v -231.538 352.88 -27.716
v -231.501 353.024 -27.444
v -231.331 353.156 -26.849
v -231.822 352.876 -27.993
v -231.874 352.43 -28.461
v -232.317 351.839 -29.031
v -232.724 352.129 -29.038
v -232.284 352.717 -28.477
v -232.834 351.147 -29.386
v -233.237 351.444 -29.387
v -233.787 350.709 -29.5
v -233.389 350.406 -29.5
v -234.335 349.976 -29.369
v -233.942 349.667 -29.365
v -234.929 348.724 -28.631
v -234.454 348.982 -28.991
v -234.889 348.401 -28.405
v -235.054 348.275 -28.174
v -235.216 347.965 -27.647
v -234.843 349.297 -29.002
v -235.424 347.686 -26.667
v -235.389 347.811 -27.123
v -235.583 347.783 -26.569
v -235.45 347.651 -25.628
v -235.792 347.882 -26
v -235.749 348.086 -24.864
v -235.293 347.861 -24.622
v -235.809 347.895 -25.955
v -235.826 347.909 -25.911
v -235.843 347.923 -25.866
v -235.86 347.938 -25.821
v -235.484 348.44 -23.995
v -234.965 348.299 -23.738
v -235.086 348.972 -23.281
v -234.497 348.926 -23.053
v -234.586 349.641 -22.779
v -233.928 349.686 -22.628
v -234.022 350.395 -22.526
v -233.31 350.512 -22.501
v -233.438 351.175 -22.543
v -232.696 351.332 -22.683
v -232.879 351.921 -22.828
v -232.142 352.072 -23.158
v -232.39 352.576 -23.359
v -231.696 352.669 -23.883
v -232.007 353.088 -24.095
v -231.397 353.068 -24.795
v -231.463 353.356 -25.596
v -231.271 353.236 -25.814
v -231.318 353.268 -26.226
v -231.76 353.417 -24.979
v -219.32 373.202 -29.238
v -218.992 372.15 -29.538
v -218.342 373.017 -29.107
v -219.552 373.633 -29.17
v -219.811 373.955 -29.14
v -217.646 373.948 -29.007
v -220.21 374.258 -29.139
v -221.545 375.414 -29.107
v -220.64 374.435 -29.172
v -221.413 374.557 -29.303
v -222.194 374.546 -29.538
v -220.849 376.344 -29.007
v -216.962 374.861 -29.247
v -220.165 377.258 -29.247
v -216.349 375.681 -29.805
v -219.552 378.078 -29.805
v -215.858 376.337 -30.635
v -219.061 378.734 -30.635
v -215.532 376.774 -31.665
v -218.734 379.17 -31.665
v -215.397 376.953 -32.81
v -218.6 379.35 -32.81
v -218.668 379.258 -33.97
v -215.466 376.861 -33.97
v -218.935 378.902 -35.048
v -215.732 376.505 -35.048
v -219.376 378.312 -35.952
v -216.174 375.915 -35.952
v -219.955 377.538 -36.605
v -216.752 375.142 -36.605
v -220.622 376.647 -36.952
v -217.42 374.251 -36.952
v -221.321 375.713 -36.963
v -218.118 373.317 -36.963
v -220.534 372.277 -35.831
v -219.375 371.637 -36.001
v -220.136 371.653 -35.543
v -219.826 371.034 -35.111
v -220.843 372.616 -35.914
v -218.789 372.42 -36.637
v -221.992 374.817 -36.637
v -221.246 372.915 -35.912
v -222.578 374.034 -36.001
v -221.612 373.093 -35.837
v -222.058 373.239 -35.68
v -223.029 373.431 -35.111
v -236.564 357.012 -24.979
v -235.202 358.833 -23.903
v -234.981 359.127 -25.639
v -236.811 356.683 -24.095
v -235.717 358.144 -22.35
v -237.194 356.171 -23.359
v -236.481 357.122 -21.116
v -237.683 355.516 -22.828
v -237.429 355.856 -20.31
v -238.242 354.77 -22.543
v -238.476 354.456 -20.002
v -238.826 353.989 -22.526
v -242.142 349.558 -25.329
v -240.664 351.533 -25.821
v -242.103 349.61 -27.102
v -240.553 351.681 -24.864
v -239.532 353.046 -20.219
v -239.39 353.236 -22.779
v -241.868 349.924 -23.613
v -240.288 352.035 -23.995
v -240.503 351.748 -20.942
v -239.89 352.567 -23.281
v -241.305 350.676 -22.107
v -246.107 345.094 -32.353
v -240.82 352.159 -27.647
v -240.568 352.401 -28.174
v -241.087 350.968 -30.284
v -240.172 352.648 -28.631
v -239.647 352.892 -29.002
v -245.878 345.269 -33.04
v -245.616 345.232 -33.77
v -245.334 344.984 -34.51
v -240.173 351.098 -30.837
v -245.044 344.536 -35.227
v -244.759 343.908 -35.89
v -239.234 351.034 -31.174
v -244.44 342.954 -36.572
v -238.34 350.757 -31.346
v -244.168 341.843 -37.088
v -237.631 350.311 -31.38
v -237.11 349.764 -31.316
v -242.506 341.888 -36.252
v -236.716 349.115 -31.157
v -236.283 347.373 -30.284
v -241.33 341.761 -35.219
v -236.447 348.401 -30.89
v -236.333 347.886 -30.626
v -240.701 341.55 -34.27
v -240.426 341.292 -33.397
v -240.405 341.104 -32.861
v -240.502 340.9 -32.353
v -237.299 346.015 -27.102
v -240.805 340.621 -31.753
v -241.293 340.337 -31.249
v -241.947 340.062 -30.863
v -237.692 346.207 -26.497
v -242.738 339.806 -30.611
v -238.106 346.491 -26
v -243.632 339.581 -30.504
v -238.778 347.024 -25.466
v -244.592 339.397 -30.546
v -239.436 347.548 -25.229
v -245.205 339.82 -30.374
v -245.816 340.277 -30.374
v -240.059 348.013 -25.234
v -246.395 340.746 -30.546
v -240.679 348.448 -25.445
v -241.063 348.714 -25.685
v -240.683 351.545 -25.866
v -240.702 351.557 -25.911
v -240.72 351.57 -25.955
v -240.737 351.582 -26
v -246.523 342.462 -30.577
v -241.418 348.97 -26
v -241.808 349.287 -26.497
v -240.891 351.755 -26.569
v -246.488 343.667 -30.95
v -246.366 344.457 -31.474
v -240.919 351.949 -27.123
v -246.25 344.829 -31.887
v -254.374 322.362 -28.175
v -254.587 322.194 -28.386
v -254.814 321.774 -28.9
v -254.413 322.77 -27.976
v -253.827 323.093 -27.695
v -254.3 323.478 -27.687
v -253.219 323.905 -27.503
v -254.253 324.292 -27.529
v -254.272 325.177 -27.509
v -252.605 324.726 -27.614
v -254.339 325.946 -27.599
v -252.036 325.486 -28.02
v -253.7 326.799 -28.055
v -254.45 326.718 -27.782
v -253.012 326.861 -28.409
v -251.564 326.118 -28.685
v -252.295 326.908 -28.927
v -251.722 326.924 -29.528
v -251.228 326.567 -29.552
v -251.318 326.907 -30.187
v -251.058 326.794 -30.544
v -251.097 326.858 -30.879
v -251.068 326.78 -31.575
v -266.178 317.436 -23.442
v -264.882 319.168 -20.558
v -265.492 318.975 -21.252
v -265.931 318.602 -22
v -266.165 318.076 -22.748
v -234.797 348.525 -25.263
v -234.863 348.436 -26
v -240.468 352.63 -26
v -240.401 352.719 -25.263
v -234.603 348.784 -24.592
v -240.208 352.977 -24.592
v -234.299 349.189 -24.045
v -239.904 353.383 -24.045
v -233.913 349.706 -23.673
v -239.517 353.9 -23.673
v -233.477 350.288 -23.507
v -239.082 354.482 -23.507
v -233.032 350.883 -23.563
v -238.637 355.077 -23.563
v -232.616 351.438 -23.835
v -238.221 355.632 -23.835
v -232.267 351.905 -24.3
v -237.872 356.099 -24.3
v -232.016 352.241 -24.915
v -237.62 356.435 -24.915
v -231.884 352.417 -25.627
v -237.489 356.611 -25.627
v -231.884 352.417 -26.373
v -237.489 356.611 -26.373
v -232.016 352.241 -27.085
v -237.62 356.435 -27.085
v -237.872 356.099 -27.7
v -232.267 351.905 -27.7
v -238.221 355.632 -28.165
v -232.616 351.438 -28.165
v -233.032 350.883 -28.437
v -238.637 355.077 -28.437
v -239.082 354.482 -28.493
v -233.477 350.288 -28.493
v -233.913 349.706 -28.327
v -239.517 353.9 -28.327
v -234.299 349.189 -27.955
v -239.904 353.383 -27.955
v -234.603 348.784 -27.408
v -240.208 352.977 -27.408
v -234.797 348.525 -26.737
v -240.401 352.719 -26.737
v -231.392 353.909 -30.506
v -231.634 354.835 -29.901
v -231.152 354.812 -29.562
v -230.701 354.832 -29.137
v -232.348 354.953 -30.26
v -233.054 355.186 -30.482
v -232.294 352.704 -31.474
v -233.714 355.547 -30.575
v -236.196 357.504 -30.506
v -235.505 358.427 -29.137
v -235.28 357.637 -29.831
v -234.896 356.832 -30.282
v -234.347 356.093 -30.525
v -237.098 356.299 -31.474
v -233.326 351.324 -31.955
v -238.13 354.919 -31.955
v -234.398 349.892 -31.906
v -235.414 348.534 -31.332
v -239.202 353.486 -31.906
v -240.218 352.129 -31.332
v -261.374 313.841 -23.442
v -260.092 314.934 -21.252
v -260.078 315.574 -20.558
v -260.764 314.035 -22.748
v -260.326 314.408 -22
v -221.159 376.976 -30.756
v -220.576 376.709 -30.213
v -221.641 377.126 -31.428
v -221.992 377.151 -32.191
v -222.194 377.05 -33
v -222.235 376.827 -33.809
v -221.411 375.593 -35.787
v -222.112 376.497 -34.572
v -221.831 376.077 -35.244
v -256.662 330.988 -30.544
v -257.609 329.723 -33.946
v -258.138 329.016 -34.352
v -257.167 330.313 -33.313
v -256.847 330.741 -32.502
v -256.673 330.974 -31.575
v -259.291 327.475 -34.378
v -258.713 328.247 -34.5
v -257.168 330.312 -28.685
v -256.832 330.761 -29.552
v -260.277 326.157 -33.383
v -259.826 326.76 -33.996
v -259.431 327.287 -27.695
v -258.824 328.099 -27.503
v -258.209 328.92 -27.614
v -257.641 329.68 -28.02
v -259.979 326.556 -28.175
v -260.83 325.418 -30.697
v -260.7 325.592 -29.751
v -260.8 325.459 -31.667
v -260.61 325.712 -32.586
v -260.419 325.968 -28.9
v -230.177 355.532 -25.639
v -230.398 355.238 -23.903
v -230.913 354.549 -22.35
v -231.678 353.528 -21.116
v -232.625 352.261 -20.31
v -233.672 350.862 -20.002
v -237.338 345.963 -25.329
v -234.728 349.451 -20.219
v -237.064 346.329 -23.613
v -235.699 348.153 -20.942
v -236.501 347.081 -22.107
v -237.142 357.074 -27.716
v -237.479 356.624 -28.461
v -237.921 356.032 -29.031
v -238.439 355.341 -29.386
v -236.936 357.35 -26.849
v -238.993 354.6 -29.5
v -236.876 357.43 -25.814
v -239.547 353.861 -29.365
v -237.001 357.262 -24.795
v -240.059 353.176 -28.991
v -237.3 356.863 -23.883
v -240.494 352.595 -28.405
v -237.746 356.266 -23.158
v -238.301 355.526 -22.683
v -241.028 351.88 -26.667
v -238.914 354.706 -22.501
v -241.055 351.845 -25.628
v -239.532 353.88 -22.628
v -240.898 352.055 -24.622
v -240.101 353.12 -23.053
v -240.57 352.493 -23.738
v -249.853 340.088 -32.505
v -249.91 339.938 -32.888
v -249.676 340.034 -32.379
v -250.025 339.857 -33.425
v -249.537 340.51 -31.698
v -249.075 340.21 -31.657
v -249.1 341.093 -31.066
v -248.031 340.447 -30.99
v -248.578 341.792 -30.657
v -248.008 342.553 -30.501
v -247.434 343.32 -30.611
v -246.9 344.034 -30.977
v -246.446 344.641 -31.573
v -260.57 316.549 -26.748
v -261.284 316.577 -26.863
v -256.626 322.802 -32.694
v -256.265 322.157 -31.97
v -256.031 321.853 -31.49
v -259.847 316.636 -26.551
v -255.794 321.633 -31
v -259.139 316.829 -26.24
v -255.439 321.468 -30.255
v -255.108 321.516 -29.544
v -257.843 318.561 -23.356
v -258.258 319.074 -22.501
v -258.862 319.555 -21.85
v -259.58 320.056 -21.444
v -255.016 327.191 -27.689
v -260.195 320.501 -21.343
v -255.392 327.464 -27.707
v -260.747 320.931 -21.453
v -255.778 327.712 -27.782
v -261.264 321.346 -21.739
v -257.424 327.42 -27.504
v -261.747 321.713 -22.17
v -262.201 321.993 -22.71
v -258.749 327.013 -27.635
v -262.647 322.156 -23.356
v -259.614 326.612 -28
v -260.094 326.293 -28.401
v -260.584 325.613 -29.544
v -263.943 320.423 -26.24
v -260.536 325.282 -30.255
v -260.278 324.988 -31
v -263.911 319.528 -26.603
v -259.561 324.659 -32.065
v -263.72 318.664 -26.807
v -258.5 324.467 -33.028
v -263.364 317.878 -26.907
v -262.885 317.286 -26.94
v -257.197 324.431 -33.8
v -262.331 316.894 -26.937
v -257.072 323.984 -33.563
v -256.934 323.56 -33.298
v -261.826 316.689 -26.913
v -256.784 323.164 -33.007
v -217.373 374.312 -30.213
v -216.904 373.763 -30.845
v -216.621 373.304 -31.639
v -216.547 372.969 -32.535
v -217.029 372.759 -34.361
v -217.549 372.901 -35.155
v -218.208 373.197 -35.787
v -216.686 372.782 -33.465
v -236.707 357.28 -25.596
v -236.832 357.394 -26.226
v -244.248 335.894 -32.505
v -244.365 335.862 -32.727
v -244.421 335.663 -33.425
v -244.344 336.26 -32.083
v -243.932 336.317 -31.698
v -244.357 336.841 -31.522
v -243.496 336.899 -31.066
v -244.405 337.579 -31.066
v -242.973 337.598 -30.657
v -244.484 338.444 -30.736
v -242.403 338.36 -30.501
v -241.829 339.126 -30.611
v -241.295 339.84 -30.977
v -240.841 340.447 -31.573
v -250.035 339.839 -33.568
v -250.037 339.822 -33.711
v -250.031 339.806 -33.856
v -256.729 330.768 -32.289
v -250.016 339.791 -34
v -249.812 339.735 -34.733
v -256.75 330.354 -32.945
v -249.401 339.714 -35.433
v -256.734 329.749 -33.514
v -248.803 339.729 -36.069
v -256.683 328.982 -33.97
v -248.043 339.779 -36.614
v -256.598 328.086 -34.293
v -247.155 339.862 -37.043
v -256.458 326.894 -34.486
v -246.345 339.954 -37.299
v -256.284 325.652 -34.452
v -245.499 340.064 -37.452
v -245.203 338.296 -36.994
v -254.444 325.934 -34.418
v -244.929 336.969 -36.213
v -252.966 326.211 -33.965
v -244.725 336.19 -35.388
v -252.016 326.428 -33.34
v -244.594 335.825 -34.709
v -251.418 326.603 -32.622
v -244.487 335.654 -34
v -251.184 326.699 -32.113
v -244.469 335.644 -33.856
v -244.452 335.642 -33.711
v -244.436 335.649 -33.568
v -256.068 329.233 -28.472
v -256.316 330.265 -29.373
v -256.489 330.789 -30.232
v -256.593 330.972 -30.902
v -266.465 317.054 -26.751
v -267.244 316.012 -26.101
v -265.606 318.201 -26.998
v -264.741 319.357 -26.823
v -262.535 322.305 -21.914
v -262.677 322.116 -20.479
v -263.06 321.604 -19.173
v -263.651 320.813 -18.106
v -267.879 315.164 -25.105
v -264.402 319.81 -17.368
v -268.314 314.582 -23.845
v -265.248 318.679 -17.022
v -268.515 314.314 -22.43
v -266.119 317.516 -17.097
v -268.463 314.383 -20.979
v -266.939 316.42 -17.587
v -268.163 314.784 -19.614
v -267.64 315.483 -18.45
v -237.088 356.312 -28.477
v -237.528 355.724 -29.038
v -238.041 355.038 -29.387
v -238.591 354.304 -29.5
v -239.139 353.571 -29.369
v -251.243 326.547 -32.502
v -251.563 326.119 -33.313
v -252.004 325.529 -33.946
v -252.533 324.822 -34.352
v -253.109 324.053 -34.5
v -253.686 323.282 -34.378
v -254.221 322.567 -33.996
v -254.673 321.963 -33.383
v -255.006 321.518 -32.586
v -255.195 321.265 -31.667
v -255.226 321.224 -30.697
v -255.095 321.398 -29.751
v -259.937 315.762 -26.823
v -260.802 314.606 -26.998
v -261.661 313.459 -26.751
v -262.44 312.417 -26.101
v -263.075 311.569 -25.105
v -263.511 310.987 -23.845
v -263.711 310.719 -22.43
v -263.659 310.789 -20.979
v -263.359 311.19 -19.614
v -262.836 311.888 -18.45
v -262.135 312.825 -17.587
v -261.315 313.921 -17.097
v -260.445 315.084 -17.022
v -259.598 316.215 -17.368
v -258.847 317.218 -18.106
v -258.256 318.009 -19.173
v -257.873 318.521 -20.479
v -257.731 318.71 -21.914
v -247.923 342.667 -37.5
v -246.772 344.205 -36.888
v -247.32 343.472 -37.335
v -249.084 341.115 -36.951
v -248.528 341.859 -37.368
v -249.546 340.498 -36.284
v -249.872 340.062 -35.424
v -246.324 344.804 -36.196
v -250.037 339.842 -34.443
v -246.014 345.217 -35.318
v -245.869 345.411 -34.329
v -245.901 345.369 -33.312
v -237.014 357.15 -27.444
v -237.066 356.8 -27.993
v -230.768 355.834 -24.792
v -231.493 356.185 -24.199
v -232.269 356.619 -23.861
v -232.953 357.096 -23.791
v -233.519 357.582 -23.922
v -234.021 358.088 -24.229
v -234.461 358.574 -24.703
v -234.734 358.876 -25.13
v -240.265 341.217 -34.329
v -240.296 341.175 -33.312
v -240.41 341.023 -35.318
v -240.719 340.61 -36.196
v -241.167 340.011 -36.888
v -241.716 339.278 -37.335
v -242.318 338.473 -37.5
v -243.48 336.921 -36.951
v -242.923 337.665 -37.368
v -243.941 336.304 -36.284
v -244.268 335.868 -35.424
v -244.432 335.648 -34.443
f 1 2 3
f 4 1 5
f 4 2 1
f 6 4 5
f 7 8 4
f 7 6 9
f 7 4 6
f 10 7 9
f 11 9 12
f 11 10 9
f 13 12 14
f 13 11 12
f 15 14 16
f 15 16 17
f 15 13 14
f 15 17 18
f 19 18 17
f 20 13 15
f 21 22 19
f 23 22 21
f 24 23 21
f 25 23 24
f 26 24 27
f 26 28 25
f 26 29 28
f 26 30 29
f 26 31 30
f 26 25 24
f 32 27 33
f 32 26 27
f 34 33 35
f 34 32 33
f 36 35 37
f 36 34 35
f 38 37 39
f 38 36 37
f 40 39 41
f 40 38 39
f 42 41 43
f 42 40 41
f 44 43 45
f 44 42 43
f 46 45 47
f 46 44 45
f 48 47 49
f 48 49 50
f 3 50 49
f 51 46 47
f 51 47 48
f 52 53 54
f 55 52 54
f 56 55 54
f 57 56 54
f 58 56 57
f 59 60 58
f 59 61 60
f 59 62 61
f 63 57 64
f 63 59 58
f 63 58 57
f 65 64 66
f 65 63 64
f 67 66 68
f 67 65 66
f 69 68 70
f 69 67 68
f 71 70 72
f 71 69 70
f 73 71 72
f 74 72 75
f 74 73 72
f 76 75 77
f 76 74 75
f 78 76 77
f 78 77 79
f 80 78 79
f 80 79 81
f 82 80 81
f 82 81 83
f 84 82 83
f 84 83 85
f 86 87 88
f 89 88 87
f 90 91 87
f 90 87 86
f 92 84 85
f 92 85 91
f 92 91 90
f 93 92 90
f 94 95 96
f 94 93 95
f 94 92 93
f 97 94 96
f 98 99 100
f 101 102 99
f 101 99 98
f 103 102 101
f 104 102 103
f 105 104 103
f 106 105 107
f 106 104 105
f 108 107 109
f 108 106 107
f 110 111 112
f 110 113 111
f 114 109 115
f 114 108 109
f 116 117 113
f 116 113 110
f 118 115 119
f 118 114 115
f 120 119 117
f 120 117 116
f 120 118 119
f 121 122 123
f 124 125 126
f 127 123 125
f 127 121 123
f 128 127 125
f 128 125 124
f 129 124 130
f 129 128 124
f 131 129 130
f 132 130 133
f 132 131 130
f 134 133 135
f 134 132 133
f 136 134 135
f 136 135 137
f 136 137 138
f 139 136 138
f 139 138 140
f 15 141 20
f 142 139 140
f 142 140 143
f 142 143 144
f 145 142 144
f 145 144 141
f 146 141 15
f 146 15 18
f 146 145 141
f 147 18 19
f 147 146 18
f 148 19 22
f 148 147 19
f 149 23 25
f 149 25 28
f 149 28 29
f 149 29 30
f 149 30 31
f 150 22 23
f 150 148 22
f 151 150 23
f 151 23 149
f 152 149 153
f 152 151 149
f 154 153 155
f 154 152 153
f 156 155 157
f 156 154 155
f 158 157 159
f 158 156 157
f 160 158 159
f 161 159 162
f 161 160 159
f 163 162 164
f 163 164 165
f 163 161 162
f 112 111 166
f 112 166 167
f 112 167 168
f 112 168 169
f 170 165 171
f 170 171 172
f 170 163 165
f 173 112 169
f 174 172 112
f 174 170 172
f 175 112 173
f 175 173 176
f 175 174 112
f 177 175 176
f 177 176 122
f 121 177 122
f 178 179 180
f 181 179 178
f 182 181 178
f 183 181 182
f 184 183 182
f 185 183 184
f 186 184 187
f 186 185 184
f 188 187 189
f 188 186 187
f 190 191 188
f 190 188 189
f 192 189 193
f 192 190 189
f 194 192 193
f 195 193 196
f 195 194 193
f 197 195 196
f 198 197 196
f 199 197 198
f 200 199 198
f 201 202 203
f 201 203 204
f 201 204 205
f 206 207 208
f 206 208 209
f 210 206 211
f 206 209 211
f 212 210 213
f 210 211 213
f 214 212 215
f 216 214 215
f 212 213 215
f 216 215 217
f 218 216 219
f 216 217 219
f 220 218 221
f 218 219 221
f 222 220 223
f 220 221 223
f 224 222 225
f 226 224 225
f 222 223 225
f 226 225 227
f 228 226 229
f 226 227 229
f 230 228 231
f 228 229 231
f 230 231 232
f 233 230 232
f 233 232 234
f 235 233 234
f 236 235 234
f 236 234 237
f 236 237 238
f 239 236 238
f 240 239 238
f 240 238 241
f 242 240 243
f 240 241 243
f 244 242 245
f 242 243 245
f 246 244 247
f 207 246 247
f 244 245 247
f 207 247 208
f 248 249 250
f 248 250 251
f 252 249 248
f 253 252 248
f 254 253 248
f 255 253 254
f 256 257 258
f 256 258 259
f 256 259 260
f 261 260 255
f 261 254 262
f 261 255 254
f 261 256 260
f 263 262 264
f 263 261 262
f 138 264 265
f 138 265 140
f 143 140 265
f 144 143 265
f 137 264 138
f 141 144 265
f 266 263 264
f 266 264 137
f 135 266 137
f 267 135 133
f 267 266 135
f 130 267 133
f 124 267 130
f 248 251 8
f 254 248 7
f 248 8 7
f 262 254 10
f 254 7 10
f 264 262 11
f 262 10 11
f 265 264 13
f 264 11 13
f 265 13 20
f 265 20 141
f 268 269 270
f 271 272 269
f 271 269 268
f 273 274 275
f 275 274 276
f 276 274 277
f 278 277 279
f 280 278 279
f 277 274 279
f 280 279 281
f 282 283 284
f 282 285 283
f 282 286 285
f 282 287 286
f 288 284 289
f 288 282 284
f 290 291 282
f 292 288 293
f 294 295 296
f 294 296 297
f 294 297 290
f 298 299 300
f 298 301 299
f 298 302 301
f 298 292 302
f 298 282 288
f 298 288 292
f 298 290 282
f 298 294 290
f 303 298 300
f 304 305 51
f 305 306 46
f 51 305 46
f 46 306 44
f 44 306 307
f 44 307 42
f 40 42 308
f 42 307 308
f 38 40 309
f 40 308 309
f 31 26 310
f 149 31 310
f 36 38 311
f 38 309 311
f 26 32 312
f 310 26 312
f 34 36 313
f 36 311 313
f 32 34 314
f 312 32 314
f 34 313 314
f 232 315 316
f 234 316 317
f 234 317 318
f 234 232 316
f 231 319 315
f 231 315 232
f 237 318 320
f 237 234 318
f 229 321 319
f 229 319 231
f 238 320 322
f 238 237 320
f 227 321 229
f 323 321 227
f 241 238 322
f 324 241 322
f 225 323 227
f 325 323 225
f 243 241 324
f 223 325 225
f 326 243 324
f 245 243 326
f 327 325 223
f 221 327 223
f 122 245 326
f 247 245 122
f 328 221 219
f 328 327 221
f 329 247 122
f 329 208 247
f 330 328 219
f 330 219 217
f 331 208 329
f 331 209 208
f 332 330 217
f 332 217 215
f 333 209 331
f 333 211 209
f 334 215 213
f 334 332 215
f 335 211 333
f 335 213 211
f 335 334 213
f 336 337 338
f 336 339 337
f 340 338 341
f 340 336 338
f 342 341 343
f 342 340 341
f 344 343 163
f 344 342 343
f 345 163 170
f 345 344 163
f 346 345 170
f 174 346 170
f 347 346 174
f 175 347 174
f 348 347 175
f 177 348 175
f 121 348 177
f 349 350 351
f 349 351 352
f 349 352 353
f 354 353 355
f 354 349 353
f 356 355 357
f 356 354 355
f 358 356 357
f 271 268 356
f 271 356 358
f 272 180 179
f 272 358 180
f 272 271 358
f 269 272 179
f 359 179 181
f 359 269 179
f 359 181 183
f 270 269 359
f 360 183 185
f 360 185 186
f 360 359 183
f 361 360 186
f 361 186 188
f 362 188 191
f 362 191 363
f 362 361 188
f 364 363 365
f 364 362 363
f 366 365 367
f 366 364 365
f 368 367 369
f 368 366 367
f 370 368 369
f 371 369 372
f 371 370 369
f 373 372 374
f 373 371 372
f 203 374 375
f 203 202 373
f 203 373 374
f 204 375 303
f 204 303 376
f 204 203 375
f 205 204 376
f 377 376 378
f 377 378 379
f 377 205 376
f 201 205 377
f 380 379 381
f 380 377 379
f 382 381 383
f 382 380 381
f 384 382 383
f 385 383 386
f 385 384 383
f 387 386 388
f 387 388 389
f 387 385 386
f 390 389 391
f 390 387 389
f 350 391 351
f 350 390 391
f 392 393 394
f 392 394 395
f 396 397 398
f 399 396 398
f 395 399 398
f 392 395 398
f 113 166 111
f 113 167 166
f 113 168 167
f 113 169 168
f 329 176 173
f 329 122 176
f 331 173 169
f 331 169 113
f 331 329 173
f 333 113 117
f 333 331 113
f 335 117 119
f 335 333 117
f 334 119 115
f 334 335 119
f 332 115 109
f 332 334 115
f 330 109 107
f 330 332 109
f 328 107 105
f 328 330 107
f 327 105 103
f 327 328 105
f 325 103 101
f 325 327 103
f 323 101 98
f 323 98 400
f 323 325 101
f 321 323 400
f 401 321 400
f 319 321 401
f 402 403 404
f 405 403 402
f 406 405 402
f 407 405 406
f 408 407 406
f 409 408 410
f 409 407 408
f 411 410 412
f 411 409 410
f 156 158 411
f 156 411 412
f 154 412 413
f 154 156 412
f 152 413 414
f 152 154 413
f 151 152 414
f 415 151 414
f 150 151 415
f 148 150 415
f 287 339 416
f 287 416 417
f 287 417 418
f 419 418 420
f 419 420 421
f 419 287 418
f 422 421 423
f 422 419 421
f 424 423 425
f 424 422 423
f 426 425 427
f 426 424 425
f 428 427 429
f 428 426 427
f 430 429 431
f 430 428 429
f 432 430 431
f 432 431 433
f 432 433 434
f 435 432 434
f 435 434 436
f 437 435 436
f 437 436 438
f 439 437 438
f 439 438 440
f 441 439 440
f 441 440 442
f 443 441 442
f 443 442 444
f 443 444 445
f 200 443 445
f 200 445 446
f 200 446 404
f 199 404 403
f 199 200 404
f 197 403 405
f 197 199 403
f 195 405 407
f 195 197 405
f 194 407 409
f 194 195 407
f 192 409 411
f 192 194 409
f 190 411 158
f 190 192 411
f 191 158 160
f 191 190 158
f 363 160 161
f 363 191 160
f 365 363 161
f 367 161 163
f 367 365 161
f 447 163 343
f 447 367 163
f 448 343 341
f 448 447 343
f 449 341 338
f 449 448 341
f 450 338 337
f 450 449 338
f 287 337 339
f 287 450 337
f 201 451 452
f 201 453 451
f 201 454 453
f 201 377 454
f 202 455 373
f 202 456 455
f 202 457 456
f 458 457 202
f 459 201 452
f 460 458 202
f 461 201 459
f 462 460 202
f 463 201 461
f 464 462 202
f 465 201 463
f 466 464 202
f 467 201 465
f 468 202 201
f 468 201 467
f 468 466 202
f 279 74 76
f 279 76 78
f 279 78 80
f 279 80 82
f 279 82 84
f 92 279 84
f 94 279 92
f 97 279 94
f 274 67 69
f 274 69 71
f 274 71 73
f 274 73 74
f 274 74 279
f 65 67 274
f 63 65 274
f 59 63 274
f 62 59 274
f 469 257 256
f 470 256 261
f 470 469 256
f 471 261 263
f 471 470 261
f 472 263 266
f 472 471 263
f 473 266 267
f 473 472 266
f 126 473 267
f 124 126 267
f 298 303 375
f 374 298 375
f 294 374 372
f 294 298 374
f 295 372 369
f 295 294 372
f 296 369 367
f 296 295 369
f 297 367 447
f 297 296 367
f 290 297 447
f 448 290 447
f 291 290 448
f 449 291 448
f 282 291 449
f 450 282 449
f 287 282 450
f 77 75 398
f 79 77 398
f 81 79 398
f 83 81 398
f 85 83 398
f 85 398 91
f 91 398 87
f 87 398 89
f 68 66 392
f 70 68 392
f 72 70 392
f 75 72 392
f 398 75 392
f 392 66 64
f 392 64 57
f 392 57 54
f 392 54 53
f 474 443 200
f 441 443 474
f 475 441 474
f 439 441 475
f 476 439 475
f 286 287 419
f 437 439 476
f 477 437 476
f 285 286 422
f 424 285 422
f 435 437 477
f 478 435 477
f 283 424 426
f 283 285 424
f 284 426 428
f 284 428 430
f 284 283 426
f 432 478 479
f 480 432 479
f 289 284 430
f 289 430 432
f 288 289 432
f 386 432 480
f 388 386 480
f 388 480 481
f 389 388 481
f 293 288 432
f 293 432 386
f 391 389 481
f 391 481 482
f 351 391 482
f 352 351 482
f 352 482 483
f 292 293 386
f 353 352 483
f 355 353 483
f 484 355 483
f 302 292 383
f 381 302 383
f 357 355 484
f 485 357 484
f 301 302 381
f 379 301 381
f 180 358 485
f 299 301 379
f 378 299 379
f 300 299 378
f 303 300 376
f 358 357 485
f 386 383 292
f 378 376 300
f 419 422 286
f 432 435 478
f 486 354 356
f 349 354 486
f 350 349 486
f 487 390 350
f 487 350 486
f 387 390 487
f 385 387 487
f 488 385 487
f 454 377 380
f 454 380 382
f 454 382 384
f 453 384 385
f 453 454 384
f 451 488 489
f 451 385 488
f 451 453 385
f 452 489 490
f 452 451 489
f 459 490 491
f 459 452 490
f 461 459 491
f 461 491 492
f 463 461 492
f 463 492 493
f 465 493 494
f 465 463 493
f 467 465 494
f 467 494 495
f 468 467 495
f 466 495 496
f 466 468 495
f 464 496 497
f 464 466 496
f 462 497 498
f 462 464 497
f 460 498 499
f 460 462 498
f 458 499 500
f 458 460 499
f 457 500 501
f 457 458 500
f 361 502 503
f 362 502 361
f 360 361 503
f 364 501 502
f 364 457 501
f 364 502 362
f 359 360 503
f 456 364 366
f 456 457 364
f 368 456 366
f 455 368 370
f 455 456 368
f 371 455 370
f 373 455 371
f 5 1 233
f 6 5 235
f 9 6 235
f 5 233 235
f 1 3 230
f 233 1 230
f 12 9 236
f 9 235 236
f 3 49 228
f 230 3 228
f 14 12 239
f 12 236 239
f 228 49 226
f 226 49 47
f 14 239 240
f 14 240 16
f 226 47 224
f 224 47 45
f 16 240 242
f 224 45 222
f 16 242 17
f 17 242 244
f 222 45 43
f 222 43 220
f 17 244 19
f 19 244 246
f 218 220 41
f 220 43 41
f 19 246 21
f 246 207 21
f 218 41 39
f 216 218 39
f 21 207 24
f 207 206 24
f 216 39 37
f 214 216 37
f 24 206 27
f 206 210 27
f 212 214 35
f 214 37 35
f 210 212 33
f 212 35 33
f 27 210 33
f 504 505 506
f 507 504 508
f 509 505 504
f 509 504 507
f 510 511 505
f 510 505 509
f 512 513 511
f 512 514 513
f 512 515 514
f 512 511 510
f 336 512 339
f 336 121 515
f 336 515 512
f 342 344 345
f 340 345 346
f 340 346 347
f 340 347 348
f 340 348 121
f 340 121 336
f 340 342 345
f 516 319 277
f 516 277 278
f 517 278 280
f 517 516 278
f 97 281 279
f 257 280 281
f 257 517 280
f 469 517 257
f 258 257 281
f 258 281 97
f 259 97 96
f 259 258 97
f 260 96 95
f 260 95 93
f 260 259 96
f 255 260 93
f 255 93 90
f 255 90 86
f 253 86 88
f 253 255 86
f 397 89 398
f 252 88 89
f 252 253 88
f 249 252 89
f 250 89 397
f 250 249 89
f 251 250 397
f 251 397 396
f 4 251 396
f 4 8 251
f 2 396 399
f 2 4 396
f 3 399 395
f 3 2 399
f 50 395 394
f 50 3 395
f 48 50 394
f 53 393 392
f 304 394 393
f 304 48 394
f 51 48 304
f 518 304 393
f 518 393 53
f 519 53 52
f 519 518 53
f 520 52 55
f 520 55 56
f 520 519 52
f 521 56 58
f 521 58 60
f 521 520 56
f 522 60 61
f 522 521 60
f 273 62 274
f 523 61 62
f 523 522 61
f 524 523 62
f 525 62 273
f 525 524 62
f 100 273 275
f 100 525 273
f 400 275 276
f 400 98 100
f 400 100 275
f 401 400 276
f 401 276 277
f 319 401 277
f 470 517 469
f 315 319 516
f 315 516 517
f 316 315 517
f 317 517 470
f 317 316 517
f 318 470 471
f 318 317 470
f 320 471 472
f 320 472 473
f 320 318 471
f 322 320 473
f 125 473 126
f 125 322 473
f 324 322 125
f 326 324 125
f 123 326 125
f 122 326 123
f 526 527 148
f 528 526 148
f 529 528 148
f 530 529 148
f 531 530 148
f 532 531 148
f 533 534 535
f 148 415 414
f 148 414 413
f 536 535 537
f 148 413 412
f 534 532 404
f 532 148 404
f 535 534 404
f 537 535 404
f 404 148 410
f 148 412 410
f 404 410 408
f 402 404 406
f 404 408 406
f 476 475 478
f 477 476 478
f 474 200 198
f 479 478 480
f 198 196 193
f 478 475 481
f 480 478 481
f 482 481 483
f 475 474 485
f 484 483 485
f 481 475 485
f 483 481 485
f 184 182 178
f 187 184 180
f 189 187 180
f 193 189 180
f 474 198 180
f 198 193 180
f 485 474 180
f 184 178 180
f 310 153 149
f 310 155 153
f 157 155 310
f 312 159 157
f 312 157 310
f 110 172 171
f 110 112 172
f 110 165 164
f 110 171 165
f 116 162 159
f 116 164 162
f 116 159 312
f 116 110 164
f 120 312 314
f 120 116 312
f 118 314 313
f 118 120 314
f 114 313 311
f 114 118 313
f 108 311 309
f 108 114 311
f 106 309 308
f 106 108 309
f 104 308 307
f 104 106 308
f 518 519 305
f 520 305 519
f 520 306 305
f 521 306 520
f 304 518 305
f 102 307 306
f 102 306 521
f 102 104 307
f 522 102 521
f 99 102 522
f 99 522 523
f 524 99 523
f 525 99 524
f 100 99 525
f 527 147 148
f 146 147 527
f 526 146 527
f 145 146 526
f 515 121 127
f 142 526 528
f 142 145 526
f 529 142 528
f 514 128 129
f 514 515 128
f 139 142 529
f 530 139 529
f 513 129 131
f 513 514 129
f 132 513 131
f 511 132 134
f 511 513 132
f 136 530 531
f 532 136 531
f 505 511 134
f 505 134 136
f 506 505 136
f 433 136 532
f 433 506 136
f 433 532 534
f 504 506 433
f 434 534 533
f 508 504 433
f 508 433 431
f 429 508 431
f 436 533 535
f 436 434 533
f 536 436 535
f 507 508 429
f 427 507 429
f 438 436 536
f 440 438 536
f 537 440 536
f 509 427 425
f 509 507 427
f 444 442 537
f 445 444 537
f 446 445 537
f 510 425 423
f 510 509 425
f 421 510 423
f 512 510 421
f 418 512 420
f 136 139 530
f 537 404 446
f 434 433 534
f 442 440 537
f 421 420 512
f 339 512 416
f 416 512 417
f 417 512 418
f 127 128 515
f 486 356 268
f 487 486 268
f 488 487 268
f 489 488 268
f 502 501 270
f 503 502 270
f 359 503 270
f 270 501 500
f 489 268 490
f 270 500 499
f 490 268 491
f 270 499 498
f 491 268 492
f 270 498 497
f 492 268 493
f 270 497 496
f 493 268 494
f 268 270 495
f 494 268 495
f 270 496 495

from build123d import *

# Parameters (mm, degrees)
BRAZO_1_PROFILE_R        = 3.5
BRAZO_2_PROFILE_R        = 3.5
BRAZO_3_PROFILE_R        = 3.5
BRAZO_4_PROFILE_R        = 3.5
BRAZO_CODO_1_PROFILE_R   = 3.5
BRAZO_CODO_2_PROFILE_R   = 3.5
BRAZO_CODO_3_PROFILE_R   = 3.5
OJO_PIVOTE_PROFILE_R     = 6
ANCLAJE_CABLE_PROFILE_R  = 4
OJO_ZAPATA_PROFILE_R     = 5
TALADRO_PIVOTE_PROFILE_R = 2.5


with BuildPart() as part:
    # Brazo_1: sweep along a curve in space
    with BuildLine() as brazo_1_path:
        Line((-219.3921140600151, 374.952663744163, -33), (-236.16766000662344, 352.53434404367624, -26))
    # Brazo_1 profile (on start of the path) → Brazo_1 (sweep)
    with BuildSketch(Plane(origin=(-219.3921140600151, 374.952663744163, -33), x_dir=(-0.8006542750173838, 0.5991266409502981, 0), z_dir=(-0.5812382173551968, -0.776748740117413, 0.24253562503633316))):
        Circle(BRAZO_1_PROFILE_R)
    sweep(path=brazo_1_path.line)

    # Brazo_2: sweep along a curve in space
    with BuildLine() as brazo_2_path:
        Line((-236.16766000662344, 352.53434404367624, -26), (-245.1545596208779, 340.52452991841545, -34))
    # Brazo_2 profile (on start of the path) → Brazo_2 (sweep)
    with BuildSketch(Plane(origin=(-236.16766000662344, 352.53434404367624, -26), x_dir=(-0.8006542750173846, 0.5991266409502971, 0), z_dir=(-0.5286411537796741, -0.7064596544271045, -0.4705882352941171))):
        Circle(BRAZO_2_PROFILE_R)
    sweep(path=brazo_2_path.line)

    # Brazo_3: sweep along a curve in space
    with BuildLine() as brazo_3_path:
        Line((-245.1545596208779, 340.52452991841545, -34), (-255.93883915798327, 326.11275296810254, -31))
    # Brazo_3 profile (on start of the path) → Brazo_3 (sweep)
    with BuildSketch(Plane(origin=(-245.1545596208779, 340.52452991841545, -34), x_dir=(-0.8006542750173841, 0.599126640950298, 0), z_dir=(-0.5909748782393364, -0.7897605119673778, 0.16439898730535732))):
        Circle(BRAZO_3_PROFILE_R)
    sweep(path=brazo_3_path.line)

    # Brazo_4: sweep along a curve in space
    with BuildLine() as brazo_4_path:
        Line((-255.93883915798327, 326.11275296810254, -31), (-263.1283588493868, 316.50490166789393, -22))
    # Brazo_4 profile (on start of the path) → Brazo_4 (sweep)
    with BuildSketch(Plane(origin=(-255.93883915798327, 326.11275296810254, -31), x_dir=(0, -0.6836434980231229, -0.729816119040069), z_dir=(-0.4793013127602369, -0.6405234200139078, 0.6000000000000006))):
        Circle(BRAZO_4_PROFILE_R)
    sweep(path=brazo_4_path.line)

    # Brazo_codo_1: sweep along a curve in space
    with BuildLine() as brazo_codo_1_path:
        Line((-233.3653700440626, 350.4374008003502, -26), (-238.96994996918428, 354.6312872870023, -26))
    # Brazo_codo_1 profile (on start of the path) → Brazo_codo_1 (sweep)
    with BuildSketch(Plane(origin=(-233.3653700440626, 350.4374008003502, -26), x_dir=(-0.599126640950299, -0.8006542750173832, 0), z_dir=(-0.8006542750173832, 0.599126640950299, 0))):
        Circle(BRAZO_CODO_1_PROFILE_R)
    sweep(path=brazo_codo_1_path.line)

    # Brazo_codo_2: sweep along a curve in space
    with BuildLine() as brazo_codo_2_path:
        Line((-242.35226965831706, 338.4275866750894, -34), (-247.95684958343875, 342.6214731617415, -34))
    # Brazo_codo_2 profile (on start of the path) → Brazo_codo_2 (sweep)
    with BuildSketch(Plane(origin=(-242.35226965831706, 338.4275866750894, -34), x_dir=(-0.599126640950299, -0.8006542750173832, 0), z_dir=(-0.8006542750173832, 0.599126640950299, 0))):
        Circle(BRAZO_CODO_2_PROFILE_R)
    sweep(path=brazo_codo_2_path.line)

    # Brazo_codo_3: sweep along a curve in space
    with BuildLine() as brazo_codo_3_path:
        Line((-253.13654919542245, 324.0158097247765, -31), (-258.7411291205441, 328.2096962114286, -31))
    # Brazo_codo_3 profile (on start of the path) → Brazo_codo_3 (sweep)
    with BuildSketch(Plane(origin=(-253.13654919542245, 324.0158097247765, -31), x_dir=(-0.5991266409503029, -0.8006542750173803, 0), z_dir=(-0.8006542750173803, 0.5991266409503029, 0))):
        Circle(BRAZO_CODO_3_PROFILE_R)
    sweep(path=brazo_codo_3_path.line)

    # Ojo_pivote: sweep along a curve in space
    with BuildLine() as ojo_pivote_path:
        Line((-233.76569718157128, 350.73696412082535, -26), (-238.5696228316756, 354.33172396652714, -26))
    # Ojo_pivote profile (on start of the path) → Ojo_pivote (sweep)
    with BuildSketch(Plane(origin=(-233.76569718157128, 350.73696412082535, -26), x_dir=(-0.5991266409502979, -0.8006542750173841, 0), z_dir=(-0.8006542750173841, 0.5991266409502979, 0))):
        Circle(OJO_PIVOTE_PROFILE_R)
    sweep(path=ojo_pivote_path.line)

    # Anclaje_cable: sweep along a curve in space
    with BuildLine() as anclaje_cable_path:
        Line((-217.79080550998034, 373.7544104622624, -33), (-220.9934226100499, 376.15091702606355, -33))
    # Anclaje_cable profile (on start of the path) → Anclaje_cable (sweep)
    with BuildSketch(Plane(origin=(-217.79080550998034, 373.7544104622624, -33), x_dir=(-0.5991266409502907, -0.8006542750173894, 0), z_dir=(-0.8006542750173894, 0.5991266409502907, 0))):
        Circle(ANCLAJE_CABLE_PROFILE_R)
    sweep(path=anclaje_cable_path.line)

    # Ojo_zapata: sweep along a curve in space
    with BuildLine() as ojo_zapata_path:
        Line((-260.7263960243347, 314.70752174504304, -22), (-265.530321674439, 318.3022815907448, -22))
    # Ojo_zapata profile (on start of the path) → Ojo_zapata (sweep)
    with BuildSketch(Plane(origin=(-260.7263960243347, 314.70752174504304, -22), x_dir=(-0.5991266409502979, -0.8006542750173841, 0), z_dir=(-0.8006542750173841, 0.5991266409502979, 0))):
        Circle(OJO_ZAPATA_PROFILE_R)
    sweep(path=ojo_zapata_path.line)

    # Taladro_pivote: sweep along a curve in space
    with BuildLine() as taladro_pivote_path:
        Line((-232.9650429065539, 350.13783747987503, -26), (-239.37027710669298, 354.93085060747745, -26))
    # Taladro_pivote profile (on start of the path) → Taladro_pivote (sweep, cut)
    with BuildSketch(Plane(origin=(-232.9650429065539, 350.13783747987503, -26), x_dir=(-0.5991266409502999, -0.8006542750173826, 0), z_dir=(-0.8006542750173826, 0.5991266409502999, 0))):
        Circle(TALADRO_PIVOTE_PROFILE_R)
    sweep(path=taladro_pivote_path.line, mode=Mode.SUBTRACT)


solid = part.part
